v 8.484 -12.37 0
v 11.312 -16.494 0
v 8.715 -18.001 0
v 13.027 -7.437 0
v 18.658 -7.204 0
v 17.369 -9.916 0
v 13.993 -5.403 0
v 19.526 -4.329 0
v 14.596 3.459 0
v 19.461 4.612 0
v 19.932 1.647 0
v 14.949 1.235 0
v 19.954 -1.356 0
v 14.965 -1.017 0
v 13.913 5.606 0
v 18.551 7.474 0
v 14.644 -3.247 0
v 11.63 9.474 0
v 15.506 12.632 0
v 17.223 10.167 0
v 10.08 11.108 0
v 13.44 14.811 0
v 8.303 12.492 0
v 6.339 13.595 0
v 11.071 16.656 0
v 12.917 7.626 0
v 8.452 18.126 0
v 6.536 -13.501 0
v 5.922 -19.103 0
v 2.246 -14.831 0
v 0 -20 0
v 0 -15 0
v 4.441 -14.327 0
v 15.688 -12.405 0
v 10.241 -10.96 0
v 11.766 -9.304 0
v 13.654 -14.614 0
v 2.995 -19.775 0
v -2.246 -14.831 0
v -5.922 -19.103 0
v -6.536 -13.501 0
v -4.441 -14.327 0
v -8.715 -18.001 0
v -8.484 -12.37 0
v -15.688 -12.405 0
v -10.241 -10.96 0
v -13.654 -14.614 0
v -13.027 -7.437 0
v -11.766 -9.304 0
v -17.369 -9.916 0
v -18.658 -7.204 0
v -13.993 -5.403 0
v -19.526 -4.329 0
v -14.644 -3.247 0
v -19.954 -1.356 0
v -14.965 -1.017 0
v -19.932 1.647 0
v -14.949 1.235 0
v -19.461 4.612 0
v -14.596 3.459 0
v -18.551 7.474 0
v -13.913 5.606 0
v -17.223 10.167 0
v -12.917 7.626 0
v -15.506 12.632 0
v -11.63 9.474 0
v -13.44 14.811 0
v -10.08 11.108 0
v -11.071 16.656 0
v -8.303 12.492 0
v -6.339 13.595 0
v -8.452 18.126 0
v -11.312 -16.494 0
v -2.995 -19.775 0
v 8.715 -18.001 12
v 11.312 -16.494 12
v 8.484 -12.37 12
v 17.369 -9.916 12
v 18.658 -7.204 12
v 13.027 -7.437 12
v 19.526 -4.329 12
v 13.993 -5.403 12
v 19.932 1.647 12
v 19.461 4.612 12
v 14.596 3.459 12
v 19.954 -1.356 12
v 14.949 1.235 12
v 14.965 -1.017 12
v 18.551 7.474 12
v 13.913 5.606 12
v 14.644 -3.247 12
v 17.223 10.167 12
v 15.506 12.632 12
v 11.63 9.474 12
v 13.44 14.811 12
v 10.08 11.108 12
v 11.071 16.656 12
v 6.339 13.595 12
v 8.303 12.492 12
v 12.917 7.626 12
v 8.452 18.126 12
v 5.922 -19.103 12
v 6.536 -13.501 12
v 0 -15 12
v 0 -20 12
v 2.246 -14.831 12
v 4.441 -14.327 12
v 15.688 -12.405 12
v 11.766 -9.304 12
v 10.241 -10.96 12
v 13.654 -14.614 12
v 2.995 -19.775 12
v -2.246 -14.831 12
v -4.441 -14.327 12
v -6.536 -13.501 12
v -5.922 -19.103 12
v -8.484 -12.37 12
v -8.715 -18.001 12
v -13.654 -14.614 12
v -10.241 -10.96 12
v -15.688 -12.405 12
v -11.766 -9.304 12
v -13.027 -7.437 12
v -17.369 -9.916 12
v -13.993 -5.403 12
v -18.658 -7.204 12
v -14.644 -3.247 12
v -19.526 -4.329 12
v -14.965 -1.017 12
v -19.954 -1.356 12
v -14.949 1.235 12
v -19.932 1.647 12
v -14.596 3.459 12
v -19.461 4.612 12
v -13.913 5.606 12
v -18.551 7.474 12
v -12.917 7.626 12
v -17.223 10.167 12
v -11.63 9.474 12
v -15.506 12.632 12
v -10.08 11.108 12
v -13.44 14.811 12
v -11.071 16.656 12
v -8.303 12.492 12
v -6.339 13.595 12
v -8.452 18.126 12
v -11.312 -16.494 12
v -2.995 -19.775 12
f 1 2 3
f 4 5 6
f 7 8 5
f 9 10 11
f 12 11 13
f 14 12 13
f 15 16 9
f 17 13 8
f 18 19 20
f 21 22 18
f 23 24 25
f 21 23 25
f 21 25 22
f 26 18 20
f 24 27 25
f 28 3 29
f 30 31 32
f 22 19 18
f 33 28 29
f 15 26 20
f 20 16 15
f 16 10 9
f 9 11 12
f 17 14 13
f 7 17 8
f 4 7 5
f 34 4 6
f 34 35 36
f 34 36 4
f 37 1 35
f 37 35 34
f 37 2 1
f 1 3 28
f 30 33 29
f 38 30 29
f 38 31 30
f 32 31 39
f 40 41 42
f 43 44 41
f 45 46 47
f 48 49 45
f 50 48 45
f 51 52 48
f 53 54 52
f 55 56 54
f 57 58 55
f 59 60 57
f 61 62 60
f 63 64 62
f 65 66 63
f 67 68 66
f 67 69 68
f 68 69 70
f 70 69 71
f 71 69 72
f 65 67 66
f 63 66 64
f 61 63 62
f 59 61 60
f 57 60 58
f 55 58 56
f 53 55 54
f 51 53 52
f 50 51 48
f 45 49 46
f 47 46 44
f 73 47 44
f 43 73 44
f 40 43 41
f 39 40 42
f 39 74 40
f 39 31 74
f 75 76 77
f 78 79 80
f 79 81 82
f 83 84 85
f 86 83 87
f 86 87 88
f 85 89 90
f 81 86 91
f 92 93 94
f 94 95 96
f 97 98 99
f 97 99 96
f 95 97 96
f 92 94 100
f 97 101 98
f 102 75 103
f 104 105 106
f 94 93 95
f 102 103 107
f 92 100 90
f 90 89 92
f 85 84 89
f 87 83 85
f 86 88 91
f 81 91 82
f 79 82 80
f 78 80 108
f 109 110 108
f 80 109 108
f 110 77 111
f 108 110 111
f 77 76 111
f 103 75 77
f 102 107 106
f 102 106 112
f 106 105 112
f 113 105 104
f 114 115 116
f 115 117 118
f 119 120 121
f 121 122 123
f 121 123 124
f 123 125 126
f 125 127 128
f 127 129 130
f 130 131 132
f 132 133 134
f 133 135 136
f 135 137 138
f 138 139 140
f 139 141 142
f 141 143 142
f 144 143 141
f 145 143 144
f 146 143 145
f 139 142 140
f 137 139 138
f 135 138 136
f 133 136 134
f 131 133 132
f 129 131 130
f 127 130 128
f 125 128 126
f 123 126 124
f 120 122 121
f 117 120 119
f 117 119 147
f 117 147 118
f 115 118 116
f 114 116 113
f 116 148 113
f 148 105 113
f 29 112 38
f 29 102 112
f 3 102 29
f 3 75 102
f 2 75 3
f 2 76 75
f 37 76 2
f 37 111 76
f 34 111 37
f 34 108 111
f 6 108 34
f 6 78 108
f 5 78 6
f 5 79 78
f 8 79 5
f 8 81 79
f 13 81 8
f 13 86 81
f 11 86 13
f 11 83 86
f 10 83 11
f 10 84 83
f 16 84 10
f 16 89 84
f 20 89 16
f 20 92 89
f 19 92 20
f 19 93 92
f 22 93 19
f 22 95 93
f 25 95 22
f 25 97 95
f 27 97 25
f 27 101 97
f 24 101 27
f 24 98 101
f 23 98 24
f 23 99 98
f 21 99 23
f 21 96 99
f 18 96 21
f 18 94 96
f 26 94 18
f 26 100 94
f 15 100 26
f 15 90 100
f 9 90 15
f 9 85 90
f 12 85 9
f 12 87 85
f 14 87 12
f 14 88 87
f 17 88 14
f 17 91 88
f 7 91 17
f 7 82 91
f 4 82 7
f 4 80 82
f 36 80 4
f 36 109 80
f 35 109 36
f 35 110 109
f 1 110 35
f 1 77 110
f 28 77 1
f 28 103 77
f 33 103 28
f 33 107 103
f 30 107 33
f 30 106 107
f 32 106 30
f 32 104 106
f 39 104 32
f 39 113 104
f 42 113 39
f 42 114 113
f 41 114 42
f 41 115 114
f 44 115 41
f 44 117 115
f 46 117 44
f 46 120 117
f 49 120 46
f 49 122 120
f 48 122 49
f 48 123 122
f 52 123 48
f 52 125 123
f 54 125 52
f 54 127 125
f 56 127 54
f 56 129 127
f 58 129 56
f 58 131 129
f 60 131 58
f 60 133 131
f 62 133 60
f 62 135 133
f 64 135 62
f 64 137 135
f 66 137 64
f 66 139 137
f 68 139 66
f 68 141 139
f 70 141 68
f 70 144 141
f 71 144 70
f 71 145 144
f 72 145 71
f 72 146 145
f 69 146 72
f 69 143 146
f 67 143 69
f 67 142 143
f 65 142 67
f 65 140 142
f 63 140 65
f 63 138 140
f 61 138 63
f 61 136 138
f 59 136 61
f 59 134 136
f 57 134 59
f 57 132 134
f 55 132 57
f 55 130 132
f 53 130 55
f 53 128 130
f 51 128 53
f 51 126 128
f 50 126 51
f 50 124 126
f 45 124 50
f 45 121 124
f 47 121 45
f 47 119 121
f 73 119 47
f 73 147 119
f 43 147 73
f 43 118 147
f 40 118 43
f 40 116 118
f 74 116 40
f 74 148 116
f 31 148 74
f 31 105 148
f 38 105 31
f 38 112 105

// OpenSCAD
$fn = 32;

// ----------------------------------------------------------------------
// Spring clip: 40 mm outside, 5 mm band, 50 degree opening
// ----------------------------------------------------------------------

// --- parameters (mm) ---
outer_r = 20;             // clip outside radius
inner_r = 15;             // clip bore radius
band = 5;                 // band thickness
clip_w = 12;              // clip width
opening = 50;             // opening angle

clip_profile = [[-8.452, 18.126], [-11.071, 16.656], [-13.44, 14.811], [-15.506, 12.632], [-17.223, 10.167], [-18.551, 7.474], [-19.461, 4.612], [-19.932, 1.647], [-19.954, -1.356], [-19.526, -4.329], [-18.658, -7.204], [-17.369, -9.916], [-15.688, -12.405], [-13.654, -14.614], [-11.312, -16.494], [-8.715, -18.001], [-5.922, -19.103], [-2.995, -19.775], [0, -20], [2.995, -19.775], [5.922, -19.103], [8.715, -18.001], [11.312, -16.494], [13.654, -14.614], [15.688, -12.405], [17.369, -9.916], [18.658, -7.204], [19.526, -4.329], [19.954, -1.356], [19.932, 1.647], [19.461, 4.612], [18.551, 7.474], [17.223, 10.167], [15.506, 12.632], [13.44, 14.811], [11.071, 16.656], [8.452, 18.126], [6.339, 13.595], [8.303, 12.492], [10.08, 11.108], [11.63, 9.474], [12.917, 7.626], [13.913, 5.606], [14.596, 3.459], [14.949, 1.235], [14.965, -1.017], [14.644, -3.247], [13.993, -5.403], [13.027, -7.437], [11.766, -9.304], [10.241, -10.96], [8.484, -12.37], [6.536, -13.501], [4.441, -14.327], [2.246, -14.831], [0, -15], [-2.246, -14.831], [-4.441, -14.327], [-6.536, -13.501], [-8.484, -12.37], [-10.241, -10.96], [-11.766, -9.304], [-13.027, -7.437], [-13.993, -5.403], [-14.644, -3.247], [-14.965, -1.017], [-14.949, 1.235], [-14.596, 3.459], [-13.913, 5.606], [-12.917, 7.626], [-11.63, 9.474], [-10.08, 11.108], [-8.303, 12.492], [-6.339, 13.595]];

difference() {
  union() {
    linear_extrude(height = clip_w) polygon(clip_profile);
  }
}
